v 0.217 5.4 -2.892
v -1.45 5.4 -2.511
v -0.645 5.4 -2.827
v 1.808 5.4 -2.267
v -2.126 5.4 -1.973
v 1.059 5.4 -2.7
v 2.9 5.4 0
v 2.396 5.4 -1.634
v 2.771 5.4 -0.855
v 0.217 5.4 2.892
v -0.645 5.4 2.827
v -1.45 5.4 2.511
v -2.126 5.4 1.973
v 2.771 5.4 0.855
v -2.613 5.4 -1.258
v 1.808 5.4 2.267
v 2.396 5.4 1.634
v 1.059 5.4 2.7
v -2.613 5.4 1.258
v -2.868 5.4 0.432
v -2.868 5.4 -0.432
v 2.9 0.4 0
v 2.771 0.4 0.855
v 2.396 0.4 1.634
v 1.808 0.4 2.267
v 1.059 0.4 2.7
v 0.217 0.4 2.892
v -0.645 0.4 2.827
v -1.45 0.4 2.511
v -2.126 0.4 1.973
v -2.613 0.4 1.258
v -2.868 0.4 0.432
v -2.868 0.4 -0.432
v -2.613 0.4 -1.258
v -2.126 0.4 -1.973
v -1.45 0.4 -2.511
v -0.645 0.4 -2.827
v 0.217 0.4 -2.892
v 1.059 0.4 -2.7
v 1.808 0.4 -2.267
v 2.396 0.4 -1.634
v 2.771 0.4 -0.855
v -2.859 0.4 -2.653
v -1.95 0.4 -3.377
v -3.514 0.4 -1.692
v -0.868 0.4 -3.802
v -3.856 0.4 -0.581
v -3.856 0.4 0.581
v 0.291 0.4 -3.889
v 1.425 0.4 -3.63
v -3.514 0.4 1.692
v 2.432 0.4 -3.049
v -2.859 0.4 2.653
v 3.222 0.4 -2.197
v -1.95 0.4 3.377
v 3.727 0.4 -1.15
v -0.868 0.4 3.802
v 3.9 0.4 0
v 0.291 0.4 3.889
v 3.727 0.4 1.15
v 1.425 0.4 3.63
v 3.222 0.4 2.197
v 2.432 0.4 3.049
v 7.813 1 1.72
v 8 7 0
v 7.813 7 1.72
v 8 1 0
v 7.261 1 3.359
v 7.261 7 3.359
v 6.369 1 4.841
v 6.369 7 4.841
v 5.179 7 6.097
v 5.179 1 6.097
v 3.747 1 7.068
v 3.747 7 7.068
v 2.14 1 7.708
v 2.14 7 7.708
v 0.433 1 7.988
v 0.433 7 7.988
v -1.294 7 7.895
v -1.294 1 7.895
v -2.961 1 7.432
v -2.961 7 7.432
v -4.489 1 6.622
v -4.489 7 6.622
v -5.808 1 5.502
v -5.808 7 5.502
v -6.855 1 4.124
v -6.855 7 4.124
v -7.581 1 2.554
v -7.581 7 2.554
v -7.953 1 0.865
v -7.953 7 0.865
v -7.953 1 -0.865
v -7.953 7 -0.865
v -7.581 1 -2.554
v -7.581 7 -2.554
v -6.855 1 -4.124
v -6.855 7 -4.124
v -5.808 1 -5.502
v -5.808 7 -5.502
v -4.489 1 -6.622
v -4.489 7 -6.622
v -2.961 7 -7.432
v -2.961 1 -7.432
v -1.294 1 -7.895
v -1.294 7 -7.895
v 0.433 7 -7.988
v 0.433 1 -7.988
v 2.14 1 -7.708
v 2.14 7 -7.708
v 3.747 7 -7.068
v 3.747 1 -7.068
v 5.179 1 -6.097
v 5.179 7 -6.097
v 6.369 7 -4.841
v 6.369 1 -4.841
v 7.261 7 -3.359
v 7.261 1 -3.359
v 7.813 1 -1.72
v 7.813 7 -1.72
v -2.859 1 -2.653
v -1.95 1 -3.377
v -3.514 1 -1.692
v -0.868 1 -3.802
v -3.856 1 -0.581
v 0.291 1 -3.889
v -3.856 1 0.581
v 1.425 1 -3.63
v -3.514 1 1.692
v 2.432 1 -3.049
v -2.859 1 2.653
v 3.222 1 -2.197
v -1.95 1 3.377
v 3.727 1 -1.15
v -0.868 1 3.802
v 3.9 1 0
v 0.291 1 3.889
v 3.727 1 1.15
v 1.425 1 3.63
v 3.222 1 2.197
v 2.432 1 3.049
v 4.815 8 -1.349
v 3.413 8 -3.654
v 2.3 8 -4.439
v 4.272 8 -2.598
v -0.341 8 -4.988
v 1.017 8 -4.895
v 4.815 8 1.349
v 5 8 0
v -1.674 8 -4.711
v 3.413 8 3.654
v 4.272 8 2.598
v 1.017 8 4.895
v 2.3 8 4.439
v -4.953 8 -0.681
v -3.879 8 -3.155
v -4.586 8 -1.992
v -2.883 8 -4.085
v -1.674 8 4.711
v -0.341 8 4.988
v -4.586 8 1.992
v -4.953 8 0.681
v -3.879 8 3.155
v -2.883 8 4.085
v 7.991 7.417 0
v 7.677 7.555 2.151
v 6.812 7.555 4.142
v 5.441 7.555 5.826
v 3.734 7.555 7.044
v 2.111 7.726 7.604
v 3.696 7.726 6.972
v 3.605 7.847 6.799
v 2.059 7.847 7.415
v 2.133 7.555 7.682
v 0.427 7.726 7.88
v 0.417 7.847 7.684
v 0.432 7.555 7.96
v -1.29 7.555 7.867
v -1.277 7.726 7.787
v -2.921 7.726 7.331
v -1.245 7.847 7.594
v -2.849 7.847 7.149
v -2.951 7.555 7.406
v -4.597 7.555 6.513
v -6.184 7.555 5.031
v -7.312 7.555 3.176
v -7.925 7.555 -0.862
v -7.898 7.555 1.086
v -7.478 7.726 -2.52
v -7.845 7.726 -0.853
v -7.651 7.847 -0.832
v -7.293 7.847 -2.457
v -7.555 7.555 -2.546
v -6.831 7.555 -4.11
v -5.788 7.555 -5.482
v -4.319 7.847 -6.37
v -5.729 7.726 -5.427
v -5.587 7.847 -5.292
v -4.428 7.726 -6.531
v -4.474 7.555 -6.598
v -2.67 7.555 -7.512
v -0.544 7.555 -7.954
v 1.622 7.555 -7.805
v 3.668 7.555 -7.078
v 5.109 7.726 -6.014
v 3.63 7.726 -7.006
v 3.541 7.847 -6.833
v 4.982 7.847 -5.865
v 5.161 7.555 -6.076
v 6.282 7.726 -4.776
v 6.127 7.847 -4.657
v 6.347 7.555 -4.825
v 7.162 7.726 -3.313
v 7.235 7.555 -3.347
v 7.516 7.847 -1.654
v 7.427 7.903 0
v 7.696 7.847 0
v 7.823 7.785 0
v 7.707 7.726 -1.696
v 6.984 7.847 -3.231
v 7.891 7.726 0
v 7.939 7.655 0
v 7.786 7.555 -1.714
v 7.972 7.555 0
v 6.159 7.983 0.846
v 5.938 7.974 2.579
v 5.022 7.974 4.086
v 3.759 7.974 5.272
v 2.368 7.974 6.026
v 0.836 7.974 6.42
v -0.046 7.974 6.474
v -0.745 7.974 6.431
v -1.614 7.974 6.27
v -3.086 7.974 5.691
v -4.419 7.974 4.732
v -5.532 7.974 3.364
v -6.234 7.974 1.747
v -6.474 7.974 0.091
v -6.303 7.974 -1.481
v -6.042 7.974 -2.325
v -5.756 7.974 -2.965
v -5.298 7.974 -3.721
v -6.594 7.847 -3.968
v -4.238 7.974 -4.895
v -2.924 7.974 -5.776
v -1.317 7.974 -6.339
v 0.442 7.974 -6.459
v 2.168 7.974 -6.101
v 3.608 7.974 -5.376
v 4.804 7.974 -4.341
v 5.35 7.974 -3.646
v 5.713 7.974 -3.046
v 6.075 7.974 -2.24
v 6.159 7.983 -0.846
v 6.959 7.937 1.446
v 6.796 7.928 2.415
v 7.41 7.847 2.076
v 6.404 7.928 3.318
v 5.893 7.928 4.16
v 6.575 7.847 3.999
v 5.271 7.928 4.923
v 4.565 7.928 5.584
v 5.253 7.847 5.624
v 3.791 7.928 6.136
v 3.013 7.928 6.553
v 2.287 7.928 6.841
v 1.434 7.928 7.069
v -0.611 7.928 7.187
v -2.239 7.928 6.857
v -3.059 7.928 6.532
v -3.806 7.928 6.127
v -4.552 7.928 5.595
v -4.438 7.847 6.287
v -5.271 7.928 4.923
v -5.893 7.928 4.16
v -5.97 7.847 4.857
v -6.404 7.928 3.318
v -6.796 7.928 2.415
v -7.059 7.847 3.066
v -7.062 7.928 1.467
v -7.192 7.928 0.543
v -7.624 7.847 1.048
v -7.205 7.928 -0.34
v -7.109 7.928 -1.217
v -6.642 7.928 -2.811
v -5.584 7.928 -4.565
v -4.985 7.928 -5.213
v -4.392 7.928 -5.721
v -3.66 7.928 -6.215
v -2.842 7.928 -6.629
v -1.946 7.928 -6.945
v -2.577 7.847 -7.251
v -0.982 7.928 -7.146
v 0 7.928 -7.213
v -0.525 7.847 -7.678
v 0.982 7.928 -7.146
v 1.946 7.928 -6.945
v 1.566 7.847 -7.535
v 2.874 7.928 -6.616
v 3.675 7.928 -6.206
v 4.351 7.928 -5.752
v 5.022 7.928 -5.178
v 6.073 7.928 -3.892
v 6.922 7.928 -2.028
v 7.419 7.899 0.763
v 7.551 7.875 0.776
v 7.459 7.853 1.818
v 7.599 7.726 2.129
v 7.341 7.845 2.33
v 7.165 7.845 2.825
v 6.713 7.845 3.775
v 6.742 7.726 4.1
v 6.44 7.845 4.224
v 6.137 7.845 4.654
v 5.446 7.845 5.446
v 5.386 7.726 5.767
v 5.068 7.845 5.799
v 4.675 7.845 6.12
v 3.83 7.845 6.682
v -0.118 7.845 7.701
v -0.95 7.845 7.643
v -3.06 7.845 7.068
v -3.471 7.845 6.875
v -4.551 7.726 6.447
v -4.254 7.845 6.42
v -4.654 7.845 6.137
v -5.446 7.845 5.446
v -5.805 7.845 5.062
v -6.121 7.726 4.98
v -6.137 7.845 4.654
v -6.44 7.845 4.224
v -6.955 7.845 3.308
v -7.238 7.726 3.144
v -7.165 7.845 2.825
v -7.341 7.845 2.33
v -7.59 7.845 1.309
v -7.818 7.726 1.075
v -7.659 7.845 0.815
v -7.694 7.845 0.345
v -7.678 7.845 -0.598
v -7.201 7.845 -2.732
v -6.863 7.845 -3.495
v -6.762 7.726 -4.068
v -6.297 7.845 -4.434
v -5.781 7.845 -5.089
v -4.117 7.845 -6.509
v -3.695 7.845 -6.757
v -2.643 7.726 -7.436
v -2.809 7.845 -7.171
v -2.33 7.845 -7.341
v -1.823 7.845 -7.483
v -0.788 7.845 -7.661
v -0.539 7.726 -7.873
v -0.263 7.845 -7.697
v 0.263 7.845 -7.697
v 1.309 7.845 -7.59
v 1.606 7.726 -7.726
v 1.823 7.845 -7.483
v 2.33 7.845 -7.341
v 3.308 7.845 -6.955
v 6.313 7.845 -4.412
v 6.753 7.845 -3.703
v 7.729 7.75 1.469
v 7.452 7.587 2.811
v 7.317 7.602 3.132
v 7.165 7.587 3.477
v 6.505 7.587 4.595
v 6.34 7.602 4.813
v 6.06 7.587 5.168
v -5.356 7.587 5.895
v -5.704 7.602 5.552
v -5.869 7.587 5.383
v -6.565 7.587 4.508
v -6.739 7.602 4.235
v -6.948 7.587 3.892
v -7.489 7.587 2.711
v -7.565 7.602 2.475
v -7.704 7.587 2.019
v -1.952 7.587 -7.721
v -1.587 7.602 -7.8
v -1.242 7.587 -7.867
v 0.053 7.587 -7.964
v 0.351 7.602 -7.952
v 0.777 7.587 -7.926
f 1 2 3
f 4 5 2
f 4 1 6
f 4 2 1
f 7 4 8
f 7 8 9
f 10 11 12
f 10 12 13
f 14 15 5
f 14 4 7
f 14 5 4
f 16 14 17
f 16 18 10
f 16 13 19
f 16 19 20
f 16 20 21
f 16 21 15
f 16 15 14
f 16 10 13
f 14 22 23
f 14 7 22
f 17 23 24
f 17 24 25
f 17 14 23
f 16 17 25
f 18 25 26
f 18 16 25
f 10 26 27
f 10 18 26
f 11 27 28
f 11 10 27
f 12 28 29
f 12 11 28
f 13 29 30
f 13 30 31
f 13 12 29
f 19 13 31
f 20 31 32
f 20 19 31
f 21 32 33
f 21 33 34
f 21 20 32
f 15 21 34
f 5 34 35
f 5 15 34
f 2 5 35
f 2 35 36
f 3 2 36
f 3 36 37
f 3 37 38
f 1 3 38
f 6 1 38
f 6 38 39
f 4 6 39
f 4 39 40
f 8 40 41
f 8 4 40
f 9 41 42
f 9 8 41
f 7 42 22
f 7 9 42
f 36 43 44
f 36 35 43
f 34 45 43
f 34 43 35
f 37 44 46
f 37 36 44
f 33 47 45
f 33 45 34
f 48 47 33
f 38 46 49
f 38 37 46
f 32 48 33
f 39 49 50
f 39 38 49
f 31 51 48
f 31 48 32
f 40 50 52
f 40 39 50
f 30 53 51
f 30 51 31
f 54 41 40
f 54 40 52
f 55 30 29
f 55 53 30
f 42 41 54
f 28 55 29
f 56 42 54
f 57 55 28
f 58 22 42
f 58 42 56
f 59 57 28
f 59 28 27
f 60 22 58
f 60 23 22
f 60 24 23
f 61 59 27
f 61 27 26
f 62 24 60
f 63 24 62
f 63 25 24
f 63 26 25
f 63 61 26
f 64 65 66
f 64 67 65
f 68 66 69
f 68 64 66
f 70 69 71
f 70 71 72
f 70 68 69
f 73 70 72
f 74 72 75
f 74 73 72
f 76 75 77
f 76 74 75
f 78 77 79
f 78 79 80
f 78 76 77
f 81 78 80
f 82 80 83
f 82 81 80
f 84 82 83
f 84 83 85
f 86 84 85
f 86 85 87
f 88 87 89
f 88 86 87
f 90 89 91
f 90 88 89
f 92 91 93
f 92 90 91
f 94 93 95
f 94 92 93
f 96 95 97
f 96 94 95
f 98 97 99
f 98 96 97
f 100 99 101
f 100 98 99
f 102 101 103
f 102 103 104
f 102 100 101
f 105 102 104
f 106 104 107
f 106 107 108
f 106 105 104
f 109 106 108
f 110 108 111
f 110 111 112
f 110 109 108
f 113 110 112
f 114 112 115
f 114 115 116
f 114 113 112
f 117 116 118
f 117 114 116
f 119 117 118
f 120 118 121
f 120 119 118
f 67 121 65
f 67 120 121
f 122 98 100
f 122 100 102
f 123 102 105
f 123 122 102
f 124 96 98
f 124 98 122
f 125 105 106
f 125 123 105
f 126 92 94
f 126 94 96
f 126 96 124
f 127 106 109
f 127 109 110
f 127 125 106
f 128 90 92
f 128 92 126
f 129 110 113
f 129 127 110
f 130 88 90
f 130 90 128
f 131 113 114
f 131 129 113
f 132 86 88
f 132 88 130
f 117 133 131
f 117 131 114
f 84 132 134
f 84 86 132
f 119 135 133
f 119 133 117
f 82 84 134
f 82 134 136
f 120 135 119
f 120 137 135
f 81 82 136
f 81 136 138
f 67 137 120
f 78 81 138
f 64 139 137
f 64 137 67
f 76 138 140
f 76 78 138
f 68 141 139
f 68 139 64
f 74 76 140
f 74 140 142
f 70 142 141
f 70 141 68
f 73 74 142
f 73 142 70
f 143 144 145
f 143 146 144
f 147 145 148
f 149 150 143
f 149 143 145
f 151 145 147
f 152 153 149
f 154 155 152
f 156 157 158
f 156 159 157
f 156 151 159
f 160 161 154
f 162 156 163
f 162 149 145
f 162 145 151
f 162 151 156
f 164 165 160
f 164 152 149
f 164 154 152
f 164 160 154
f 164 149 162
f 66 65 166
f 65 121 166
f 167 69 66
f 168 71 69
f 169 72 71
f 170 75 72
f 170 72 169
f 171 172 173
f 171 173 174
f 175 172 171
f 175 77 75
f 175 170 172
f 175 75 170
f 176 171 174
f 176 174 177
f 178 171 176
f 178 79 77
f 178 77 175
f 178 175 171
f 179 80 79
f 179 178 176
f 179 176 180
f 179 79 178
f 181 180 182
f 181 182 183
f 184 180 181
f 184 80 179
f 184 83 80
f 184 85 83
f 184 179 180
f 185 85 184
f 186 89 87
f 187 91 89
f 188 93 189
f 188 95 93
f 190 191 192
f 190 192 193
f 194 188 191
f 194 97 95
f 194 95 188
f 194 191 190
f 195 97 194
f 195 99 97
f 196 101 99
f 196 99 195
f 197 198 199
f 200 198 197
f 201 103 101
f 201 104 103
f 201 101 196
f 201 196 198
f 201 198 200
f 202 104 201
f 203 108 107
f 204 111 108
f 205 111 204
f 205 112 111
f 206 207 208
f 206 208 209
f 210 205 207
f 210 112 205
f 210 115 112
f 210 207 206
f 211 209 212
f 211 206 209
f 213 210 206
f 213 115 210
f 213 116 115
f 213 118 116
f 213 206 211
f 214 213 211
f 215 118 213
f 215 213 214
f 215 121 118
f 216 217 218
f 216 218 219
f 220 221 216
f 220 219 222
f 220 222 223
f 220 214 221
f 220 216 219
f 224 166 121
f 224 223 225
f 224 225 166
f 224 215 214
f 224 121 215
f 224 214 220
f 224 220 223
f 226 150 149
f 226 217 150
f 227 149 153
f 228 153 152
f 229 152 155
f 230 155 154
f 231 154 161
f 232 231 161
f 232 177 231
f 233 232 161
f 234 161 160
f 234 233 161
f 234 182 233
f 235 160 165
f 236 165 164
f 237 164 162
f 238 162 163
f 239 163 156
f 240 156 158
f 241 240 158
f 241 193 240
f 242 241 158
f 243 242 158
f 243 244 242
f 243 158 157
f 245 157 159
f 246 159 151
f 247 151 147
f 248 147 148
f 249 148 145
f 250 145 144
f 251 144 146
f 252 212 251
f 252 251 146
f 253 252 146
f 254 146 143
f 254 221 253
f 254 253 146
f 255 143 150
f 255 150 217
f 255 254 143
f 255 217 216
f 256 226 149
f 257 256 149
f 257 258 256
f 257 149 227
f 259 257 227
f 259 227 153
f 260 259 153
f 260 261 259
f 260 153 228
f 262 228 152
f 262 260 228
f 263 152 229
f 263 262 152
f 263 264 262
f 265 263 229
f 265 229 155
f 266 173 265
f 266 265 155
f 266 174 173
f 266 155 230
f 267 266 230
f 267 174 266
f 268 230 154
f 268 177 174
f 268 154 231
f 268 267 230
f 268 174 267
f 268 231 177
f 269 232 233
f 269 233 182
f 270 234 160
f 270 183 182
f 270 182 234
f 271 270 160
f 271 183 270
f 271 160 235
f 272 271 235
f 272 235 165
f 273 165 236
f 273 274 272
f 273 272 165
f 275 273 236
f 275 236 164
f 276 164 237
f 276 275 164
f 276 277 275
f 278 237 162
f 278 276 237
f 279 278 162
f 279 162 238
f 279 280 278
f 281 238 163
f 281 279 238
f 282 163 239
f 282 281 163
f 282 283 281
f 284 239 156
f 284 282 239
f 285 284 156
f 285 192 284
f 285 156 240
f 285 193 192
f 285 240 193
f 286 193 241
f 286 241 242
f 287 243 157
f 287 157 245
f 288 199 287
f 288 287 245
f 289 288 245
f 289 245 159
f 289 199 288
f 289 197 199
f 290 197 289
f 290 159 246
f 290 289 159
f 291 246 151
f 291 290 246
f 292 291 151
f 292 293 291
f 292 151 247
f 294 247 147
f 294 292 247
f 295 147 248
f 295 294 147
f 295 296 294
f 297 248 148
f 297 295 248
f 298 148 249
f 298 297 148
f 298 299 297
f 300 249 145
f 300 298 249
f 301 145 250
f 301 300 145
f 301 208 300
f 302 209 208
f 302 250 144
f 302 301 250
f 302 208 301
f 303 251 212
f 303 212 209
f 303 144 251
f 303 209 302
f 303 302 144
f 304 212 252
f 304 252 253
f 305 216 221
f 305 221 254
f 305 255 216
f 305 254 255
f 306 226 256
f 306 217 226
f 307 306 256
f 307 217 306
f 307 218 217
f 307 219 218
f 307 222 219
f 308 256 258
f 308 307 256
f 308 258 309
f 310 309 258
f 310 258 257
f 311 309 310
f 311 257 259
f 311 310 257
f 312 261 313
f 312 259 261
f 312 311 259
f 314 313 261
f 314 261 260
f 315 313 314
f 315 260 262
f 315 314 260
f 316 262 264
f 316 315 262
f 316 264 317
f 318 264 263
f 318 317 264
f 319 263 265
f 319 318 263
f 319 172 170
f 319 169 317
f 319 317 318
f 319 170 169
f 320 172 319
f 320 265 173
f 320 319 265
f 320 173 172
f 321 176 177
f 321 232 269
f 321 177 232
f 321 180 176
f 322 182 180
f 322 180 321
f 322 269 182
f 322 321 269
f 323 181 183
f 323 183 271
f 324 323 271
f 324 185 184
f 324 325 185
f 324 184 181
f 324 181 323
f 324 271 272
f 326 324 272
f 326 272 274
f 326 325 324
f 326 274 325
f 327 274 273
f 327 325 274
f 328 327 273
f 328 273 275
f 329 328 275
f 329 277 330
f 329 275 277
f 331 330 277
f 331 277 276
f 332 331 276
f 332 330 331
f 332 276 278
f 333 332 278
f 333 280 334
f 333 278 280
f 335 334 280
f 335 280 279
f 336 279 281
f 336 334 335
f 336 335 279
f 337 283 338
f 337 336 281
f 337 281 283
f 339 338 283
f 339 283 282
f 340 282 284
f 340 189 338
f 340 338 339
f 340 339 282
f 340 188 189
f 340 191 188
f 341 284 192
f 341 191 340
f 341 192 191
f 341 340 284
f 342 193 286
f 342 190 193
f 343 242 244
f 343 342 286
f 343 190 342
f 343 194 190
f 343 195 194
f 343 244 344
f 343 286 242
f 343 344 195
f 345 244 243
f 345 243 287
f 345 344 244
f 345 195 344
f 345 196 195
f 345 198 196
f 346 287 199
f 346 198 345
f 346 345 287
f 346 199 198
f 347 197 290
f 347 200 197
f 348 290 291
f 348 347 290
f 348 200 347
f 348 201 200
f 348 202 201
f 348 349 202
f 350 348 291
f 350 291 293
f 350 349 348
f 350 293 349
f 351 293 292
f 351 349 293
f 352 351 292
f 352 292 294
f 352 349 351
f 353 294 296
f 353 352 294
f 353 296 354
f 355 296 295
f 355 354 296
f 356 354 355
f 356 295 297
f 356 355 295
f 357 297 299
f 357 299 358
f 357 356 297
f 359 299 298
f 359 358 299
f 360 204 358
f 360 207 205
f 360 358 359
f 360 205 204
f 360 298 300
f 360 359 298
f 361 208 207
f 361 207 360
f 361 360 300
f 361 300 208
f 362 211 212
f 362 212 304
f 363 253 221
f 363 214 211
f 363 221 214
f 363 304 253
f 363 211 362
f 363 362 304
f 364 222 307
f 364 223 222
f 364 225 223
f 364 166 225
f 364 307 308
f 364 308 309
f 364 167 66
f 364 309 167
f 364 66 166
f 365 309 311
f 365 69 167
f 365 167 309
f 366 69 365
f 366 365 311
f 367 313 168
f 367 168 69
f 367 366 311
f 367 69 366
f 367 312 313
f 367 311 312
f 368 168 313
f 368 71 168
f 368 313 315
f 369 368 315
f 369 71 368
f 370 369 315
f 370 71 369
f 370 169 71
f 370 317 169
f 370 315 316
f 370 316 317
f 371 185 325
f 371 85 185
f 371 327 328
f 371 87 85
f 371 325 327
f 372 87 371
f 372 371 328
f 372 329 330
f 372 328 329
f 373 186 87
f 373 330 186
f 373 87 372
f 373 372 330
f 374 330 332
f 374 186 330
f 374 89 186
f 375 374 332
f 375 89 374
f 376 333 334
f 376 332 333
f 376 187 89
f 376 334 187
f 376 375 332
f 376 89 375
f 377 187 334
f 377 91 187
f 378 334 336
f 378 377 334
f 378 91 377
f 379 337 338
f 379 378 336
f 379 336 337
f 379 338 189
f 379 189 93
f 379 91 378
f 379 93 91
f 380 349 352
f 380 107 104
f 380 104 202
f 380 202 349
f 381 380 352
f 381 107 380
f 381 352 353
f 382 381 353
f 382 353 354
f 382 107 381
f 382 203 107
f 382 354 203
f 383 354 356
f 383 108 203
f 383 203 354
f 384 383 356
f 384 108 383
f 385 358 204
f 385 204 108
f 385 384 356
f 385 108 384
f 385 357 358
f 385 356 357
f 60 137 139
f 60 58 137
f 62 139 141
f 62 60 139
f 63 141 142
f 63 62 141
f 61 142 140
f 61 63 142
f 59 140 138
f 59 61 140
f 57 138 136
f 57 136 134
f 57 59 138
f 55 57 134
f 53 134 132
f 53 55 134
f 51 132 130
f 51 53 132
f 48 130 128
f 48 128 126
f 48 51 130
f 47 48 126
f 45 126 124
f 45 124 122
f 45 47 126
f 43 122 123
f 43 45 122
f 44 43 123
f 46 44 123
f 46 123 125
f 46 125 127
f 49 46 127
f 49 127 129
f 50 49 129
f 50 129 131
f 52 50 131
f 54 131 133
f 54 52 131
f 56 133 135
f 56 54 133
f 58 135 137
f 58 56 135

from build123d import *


with BuildPart() as part:
    # 草图1 → 旋转1 (revolve)
    with BuildSketch(Plane.XY):
        Polygon((0, 8), (8, 8), (8, 1), (3.9, 1), (3.9, 0.4), (2.9, 0.4), (2.9, 5.4), (0, 5.4), align=None)
    revolve(axis=Axis((0, 8, 0), (0, -1, 0)))

    # 草图2 → 切除-旋转1 (revolve, cut)
    with BuildSketch(Plane.XY):
        with BuildLine():
            Line((5, 8), (8, 8))
            Line((8, 8), (8, 7))
            add(Edge.make_bspline(
                [(5, 8), (5.693488859, 8), (7.464893787, 7.980007099), (7.989740211, 7.704714141), (8, 7.515407368), (8, 7)],
                knots=[0, 0, 0, 0, 0.50578806, 0.60578806, 1, 1, 1, 1], degree=3))
        make_face()
    revolve(axis=Axis((0, 0, 0), (0, -1, 0)), mode=Mode.SUBTRACT)


solid = part.part
